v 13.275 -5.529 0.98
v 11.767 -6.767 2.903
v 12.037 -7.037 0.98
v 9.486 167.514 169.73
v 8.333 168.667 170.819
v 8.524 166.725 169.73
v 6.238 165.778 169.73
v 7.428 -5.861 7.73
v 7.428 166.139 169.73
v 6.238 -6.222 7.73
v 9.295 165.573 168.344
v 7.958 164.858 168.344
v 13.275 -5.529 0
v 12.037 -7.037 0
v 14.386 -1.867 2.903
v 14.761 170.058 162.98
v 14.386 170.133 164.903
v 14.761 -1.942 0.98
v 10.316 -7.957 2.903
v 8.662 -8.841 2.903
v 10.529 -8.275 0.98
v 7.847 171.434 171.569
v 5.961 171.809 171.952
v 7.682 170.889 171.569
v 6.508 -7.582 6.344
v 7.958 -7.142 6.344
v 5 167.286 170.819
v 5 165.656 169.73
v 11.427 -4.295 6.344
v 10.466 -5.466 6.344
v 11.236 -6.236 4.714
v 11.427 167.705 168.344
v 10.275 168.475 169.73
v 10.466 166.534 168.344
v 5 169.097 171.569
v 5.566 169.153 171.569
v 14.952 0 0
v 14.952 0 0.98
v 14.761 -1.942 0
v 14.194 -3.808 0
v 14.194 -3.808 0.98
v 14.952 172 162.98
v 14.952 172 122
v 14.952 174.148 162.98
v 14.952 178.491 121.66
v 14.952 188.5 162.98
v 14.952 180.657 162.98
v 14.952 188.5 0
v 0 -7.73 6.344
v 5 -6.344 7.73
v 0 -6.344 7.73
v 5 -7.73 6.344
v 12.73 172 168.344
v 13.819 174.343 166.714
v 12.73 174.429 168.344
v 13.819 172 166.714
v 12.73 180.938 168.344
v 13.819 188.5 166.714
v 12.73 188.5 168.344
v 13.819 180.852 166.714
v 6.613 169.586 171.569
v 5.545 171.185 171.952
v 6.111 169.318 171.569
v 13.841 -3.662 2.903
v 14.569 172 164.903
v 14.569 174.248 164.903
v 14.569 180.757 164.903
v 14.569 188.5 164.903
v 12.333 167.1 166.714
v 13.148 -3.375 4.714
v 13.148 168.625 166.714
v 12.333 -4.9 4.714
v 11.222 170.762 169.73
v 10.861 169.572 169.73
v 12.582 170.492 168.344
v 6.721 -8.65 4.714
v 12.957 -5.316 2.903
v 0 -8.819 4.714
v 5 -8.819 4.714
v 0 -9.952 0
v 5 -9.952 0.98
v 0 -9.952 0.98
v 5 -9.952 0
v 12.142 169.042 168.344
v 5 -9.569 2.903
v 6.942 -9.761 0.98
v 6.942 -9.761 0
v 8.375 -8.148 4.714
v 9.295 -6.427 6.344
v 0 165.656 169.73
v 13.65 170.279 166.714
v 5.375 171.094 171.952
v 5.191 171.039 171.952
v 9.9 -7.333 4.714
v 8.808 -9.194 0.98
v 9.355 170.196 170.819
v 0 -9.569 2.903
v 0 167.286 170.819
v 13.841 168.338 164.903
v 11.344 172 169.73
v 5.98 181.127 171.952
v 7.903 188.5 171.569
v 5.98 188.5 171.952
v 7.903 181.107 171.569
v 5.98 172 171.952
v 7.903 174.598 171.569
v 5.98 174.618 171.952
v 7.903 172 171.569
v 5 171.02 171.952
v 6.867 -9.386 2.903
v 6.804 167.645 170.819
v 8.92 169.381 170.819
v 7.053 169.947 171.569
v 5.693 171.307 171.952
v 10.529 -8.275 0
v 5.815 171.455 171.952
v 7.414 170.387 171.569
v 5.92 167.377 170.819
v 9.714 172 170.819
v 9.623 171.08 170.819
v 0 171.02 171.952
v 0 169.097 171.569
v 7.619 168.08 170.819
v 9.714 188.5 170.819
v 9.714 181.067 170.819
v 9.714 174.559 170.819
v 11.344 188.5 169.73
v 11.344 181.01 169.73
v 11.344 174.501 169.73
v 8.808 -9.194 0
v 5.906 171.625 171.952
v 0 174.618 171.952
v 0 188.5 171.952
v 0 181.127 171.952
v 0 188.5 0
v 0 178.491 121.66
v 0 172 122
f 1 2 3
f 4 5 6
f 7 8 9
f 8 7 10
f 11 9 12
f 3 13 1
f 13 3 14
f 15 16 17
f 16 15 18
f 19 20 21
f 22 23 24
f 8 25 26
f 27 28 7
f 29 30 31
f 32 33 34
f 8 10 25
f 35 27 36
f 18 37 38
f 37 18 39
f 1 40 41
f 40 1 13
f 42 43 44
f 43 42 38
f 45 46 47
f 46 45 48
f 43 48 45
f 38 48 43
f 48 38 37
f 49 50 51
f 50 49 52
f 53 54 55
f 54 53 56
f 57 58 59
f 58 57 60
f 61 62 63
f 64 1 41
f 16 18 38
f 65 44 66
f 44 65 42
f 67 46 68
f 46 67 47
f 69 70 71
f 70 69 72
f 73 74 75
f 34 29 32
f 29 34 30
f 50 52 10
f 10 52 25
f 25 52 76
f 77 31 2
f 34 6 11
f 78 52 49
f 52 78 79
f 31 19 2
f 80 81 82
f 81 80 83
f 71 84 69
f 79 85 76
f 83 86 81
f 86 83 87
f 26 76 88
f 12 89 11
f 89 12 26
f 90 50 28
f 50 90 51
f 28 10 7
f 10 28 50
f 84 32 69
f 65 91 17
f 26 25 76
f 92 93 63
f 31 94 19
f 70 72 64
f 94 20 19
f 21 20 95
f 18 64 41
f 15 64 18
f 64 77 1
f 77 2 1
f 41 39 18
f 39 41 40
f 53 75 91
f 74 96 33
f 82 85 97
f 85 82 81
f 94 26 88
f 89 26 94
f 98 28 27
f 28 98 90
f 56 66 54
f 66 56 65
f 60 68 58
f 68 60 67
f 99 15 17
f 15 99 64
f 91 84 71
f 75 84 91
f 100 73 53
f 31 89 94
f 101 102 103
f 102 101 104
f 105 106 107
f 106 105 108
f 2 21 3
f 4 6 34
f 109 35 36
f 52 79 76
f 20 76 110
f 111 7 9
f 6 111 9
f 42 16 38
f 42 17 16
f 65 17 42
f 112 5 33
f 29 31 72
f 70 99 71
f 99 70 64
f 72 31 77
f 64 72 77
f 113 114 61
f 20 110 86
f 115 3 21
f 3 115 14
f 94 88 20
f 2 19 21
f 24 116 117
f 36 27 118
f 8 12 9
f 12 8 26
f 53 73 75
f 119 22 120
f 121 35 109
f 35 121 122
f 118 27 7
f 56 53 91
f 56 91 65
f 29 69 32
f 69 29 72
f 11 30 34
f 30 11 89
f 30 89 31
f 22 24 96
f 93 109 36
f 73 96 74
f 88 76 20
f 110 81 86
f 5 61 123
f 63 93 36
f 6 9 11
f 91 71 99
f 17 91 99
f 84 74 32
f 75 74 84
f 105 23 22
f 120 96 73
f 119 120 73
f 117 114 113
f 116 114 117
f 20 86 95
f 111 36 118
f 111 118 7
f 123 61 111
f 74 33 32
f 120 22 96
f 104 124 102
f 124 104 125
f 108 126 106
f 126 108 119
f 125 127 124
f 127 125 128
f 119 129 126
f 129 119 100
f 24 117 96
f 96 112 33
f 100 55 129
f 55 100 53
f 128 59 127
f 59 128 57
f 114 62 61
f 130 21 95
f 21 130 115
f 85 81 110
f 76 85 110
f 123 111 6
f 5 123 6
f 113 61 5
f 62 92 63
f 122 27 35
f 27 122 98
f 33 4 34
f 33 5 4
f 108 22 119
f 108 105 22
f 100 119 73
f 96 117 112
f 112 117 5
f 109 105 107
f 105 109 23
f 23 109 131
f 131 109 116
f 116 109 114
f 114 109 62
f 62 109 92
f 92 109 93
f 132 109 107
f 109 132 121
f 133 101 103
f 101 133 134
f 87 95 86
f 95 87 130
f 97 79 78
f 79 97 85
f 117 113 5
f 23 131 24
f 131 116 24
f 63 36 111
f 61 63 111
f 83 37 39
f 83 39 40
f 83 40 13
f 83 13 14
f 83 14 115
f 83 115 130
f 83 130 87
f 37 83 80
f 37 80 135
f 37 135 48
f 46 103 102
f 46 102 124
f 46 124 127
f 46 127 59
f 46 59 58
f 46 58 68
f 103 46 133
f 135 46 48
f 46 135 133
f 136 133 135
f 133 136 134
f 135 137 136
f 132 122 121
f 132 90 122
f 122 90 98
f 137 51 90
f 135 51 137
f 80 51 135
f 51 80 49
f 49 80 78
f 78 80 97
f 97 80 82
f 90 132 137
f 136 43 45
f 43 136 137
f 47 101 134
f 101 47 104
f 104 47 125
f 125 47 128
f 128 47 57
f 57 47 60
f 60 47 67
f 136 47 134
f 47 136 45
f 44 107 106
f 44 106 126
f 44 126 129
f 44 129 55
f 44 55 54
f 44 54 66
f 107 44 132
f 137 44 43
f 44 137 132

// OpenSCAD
thick = 2;
spaceH = 122;
boardD = 6.5;

W = 15;
H = spaceH + 50;
D = H + 10 + boardD;

difference() {
    hull() {
        for (x = [0, W - 10]) {
            translate([x, 0, 0])
                sphere(r = 10, $fn = 32);
            translate([x, D, 0])
                sphere(r = 10, $fn = 32);
            translate([x, D, H - 10])
               sphere(r = 10, $fn = 32);
            translate([x, D - 10 - boardD, H - 10])
                sphere(r = 10, $fn = 32);
        }
    }
    translate([-200, -200, -100])
        cube([400, 400, 100]);
    translate([-200, D, -200])
        cube([400, 100, 400]);
    translate([-100, -200, -200])
        cube([100, 400, 400]);
    translate([0, D - 10 - boardD, spaceH])
        rotate([-3, 0, 0])
            cube([W, boardD, H - spaceH + 10]);
}
